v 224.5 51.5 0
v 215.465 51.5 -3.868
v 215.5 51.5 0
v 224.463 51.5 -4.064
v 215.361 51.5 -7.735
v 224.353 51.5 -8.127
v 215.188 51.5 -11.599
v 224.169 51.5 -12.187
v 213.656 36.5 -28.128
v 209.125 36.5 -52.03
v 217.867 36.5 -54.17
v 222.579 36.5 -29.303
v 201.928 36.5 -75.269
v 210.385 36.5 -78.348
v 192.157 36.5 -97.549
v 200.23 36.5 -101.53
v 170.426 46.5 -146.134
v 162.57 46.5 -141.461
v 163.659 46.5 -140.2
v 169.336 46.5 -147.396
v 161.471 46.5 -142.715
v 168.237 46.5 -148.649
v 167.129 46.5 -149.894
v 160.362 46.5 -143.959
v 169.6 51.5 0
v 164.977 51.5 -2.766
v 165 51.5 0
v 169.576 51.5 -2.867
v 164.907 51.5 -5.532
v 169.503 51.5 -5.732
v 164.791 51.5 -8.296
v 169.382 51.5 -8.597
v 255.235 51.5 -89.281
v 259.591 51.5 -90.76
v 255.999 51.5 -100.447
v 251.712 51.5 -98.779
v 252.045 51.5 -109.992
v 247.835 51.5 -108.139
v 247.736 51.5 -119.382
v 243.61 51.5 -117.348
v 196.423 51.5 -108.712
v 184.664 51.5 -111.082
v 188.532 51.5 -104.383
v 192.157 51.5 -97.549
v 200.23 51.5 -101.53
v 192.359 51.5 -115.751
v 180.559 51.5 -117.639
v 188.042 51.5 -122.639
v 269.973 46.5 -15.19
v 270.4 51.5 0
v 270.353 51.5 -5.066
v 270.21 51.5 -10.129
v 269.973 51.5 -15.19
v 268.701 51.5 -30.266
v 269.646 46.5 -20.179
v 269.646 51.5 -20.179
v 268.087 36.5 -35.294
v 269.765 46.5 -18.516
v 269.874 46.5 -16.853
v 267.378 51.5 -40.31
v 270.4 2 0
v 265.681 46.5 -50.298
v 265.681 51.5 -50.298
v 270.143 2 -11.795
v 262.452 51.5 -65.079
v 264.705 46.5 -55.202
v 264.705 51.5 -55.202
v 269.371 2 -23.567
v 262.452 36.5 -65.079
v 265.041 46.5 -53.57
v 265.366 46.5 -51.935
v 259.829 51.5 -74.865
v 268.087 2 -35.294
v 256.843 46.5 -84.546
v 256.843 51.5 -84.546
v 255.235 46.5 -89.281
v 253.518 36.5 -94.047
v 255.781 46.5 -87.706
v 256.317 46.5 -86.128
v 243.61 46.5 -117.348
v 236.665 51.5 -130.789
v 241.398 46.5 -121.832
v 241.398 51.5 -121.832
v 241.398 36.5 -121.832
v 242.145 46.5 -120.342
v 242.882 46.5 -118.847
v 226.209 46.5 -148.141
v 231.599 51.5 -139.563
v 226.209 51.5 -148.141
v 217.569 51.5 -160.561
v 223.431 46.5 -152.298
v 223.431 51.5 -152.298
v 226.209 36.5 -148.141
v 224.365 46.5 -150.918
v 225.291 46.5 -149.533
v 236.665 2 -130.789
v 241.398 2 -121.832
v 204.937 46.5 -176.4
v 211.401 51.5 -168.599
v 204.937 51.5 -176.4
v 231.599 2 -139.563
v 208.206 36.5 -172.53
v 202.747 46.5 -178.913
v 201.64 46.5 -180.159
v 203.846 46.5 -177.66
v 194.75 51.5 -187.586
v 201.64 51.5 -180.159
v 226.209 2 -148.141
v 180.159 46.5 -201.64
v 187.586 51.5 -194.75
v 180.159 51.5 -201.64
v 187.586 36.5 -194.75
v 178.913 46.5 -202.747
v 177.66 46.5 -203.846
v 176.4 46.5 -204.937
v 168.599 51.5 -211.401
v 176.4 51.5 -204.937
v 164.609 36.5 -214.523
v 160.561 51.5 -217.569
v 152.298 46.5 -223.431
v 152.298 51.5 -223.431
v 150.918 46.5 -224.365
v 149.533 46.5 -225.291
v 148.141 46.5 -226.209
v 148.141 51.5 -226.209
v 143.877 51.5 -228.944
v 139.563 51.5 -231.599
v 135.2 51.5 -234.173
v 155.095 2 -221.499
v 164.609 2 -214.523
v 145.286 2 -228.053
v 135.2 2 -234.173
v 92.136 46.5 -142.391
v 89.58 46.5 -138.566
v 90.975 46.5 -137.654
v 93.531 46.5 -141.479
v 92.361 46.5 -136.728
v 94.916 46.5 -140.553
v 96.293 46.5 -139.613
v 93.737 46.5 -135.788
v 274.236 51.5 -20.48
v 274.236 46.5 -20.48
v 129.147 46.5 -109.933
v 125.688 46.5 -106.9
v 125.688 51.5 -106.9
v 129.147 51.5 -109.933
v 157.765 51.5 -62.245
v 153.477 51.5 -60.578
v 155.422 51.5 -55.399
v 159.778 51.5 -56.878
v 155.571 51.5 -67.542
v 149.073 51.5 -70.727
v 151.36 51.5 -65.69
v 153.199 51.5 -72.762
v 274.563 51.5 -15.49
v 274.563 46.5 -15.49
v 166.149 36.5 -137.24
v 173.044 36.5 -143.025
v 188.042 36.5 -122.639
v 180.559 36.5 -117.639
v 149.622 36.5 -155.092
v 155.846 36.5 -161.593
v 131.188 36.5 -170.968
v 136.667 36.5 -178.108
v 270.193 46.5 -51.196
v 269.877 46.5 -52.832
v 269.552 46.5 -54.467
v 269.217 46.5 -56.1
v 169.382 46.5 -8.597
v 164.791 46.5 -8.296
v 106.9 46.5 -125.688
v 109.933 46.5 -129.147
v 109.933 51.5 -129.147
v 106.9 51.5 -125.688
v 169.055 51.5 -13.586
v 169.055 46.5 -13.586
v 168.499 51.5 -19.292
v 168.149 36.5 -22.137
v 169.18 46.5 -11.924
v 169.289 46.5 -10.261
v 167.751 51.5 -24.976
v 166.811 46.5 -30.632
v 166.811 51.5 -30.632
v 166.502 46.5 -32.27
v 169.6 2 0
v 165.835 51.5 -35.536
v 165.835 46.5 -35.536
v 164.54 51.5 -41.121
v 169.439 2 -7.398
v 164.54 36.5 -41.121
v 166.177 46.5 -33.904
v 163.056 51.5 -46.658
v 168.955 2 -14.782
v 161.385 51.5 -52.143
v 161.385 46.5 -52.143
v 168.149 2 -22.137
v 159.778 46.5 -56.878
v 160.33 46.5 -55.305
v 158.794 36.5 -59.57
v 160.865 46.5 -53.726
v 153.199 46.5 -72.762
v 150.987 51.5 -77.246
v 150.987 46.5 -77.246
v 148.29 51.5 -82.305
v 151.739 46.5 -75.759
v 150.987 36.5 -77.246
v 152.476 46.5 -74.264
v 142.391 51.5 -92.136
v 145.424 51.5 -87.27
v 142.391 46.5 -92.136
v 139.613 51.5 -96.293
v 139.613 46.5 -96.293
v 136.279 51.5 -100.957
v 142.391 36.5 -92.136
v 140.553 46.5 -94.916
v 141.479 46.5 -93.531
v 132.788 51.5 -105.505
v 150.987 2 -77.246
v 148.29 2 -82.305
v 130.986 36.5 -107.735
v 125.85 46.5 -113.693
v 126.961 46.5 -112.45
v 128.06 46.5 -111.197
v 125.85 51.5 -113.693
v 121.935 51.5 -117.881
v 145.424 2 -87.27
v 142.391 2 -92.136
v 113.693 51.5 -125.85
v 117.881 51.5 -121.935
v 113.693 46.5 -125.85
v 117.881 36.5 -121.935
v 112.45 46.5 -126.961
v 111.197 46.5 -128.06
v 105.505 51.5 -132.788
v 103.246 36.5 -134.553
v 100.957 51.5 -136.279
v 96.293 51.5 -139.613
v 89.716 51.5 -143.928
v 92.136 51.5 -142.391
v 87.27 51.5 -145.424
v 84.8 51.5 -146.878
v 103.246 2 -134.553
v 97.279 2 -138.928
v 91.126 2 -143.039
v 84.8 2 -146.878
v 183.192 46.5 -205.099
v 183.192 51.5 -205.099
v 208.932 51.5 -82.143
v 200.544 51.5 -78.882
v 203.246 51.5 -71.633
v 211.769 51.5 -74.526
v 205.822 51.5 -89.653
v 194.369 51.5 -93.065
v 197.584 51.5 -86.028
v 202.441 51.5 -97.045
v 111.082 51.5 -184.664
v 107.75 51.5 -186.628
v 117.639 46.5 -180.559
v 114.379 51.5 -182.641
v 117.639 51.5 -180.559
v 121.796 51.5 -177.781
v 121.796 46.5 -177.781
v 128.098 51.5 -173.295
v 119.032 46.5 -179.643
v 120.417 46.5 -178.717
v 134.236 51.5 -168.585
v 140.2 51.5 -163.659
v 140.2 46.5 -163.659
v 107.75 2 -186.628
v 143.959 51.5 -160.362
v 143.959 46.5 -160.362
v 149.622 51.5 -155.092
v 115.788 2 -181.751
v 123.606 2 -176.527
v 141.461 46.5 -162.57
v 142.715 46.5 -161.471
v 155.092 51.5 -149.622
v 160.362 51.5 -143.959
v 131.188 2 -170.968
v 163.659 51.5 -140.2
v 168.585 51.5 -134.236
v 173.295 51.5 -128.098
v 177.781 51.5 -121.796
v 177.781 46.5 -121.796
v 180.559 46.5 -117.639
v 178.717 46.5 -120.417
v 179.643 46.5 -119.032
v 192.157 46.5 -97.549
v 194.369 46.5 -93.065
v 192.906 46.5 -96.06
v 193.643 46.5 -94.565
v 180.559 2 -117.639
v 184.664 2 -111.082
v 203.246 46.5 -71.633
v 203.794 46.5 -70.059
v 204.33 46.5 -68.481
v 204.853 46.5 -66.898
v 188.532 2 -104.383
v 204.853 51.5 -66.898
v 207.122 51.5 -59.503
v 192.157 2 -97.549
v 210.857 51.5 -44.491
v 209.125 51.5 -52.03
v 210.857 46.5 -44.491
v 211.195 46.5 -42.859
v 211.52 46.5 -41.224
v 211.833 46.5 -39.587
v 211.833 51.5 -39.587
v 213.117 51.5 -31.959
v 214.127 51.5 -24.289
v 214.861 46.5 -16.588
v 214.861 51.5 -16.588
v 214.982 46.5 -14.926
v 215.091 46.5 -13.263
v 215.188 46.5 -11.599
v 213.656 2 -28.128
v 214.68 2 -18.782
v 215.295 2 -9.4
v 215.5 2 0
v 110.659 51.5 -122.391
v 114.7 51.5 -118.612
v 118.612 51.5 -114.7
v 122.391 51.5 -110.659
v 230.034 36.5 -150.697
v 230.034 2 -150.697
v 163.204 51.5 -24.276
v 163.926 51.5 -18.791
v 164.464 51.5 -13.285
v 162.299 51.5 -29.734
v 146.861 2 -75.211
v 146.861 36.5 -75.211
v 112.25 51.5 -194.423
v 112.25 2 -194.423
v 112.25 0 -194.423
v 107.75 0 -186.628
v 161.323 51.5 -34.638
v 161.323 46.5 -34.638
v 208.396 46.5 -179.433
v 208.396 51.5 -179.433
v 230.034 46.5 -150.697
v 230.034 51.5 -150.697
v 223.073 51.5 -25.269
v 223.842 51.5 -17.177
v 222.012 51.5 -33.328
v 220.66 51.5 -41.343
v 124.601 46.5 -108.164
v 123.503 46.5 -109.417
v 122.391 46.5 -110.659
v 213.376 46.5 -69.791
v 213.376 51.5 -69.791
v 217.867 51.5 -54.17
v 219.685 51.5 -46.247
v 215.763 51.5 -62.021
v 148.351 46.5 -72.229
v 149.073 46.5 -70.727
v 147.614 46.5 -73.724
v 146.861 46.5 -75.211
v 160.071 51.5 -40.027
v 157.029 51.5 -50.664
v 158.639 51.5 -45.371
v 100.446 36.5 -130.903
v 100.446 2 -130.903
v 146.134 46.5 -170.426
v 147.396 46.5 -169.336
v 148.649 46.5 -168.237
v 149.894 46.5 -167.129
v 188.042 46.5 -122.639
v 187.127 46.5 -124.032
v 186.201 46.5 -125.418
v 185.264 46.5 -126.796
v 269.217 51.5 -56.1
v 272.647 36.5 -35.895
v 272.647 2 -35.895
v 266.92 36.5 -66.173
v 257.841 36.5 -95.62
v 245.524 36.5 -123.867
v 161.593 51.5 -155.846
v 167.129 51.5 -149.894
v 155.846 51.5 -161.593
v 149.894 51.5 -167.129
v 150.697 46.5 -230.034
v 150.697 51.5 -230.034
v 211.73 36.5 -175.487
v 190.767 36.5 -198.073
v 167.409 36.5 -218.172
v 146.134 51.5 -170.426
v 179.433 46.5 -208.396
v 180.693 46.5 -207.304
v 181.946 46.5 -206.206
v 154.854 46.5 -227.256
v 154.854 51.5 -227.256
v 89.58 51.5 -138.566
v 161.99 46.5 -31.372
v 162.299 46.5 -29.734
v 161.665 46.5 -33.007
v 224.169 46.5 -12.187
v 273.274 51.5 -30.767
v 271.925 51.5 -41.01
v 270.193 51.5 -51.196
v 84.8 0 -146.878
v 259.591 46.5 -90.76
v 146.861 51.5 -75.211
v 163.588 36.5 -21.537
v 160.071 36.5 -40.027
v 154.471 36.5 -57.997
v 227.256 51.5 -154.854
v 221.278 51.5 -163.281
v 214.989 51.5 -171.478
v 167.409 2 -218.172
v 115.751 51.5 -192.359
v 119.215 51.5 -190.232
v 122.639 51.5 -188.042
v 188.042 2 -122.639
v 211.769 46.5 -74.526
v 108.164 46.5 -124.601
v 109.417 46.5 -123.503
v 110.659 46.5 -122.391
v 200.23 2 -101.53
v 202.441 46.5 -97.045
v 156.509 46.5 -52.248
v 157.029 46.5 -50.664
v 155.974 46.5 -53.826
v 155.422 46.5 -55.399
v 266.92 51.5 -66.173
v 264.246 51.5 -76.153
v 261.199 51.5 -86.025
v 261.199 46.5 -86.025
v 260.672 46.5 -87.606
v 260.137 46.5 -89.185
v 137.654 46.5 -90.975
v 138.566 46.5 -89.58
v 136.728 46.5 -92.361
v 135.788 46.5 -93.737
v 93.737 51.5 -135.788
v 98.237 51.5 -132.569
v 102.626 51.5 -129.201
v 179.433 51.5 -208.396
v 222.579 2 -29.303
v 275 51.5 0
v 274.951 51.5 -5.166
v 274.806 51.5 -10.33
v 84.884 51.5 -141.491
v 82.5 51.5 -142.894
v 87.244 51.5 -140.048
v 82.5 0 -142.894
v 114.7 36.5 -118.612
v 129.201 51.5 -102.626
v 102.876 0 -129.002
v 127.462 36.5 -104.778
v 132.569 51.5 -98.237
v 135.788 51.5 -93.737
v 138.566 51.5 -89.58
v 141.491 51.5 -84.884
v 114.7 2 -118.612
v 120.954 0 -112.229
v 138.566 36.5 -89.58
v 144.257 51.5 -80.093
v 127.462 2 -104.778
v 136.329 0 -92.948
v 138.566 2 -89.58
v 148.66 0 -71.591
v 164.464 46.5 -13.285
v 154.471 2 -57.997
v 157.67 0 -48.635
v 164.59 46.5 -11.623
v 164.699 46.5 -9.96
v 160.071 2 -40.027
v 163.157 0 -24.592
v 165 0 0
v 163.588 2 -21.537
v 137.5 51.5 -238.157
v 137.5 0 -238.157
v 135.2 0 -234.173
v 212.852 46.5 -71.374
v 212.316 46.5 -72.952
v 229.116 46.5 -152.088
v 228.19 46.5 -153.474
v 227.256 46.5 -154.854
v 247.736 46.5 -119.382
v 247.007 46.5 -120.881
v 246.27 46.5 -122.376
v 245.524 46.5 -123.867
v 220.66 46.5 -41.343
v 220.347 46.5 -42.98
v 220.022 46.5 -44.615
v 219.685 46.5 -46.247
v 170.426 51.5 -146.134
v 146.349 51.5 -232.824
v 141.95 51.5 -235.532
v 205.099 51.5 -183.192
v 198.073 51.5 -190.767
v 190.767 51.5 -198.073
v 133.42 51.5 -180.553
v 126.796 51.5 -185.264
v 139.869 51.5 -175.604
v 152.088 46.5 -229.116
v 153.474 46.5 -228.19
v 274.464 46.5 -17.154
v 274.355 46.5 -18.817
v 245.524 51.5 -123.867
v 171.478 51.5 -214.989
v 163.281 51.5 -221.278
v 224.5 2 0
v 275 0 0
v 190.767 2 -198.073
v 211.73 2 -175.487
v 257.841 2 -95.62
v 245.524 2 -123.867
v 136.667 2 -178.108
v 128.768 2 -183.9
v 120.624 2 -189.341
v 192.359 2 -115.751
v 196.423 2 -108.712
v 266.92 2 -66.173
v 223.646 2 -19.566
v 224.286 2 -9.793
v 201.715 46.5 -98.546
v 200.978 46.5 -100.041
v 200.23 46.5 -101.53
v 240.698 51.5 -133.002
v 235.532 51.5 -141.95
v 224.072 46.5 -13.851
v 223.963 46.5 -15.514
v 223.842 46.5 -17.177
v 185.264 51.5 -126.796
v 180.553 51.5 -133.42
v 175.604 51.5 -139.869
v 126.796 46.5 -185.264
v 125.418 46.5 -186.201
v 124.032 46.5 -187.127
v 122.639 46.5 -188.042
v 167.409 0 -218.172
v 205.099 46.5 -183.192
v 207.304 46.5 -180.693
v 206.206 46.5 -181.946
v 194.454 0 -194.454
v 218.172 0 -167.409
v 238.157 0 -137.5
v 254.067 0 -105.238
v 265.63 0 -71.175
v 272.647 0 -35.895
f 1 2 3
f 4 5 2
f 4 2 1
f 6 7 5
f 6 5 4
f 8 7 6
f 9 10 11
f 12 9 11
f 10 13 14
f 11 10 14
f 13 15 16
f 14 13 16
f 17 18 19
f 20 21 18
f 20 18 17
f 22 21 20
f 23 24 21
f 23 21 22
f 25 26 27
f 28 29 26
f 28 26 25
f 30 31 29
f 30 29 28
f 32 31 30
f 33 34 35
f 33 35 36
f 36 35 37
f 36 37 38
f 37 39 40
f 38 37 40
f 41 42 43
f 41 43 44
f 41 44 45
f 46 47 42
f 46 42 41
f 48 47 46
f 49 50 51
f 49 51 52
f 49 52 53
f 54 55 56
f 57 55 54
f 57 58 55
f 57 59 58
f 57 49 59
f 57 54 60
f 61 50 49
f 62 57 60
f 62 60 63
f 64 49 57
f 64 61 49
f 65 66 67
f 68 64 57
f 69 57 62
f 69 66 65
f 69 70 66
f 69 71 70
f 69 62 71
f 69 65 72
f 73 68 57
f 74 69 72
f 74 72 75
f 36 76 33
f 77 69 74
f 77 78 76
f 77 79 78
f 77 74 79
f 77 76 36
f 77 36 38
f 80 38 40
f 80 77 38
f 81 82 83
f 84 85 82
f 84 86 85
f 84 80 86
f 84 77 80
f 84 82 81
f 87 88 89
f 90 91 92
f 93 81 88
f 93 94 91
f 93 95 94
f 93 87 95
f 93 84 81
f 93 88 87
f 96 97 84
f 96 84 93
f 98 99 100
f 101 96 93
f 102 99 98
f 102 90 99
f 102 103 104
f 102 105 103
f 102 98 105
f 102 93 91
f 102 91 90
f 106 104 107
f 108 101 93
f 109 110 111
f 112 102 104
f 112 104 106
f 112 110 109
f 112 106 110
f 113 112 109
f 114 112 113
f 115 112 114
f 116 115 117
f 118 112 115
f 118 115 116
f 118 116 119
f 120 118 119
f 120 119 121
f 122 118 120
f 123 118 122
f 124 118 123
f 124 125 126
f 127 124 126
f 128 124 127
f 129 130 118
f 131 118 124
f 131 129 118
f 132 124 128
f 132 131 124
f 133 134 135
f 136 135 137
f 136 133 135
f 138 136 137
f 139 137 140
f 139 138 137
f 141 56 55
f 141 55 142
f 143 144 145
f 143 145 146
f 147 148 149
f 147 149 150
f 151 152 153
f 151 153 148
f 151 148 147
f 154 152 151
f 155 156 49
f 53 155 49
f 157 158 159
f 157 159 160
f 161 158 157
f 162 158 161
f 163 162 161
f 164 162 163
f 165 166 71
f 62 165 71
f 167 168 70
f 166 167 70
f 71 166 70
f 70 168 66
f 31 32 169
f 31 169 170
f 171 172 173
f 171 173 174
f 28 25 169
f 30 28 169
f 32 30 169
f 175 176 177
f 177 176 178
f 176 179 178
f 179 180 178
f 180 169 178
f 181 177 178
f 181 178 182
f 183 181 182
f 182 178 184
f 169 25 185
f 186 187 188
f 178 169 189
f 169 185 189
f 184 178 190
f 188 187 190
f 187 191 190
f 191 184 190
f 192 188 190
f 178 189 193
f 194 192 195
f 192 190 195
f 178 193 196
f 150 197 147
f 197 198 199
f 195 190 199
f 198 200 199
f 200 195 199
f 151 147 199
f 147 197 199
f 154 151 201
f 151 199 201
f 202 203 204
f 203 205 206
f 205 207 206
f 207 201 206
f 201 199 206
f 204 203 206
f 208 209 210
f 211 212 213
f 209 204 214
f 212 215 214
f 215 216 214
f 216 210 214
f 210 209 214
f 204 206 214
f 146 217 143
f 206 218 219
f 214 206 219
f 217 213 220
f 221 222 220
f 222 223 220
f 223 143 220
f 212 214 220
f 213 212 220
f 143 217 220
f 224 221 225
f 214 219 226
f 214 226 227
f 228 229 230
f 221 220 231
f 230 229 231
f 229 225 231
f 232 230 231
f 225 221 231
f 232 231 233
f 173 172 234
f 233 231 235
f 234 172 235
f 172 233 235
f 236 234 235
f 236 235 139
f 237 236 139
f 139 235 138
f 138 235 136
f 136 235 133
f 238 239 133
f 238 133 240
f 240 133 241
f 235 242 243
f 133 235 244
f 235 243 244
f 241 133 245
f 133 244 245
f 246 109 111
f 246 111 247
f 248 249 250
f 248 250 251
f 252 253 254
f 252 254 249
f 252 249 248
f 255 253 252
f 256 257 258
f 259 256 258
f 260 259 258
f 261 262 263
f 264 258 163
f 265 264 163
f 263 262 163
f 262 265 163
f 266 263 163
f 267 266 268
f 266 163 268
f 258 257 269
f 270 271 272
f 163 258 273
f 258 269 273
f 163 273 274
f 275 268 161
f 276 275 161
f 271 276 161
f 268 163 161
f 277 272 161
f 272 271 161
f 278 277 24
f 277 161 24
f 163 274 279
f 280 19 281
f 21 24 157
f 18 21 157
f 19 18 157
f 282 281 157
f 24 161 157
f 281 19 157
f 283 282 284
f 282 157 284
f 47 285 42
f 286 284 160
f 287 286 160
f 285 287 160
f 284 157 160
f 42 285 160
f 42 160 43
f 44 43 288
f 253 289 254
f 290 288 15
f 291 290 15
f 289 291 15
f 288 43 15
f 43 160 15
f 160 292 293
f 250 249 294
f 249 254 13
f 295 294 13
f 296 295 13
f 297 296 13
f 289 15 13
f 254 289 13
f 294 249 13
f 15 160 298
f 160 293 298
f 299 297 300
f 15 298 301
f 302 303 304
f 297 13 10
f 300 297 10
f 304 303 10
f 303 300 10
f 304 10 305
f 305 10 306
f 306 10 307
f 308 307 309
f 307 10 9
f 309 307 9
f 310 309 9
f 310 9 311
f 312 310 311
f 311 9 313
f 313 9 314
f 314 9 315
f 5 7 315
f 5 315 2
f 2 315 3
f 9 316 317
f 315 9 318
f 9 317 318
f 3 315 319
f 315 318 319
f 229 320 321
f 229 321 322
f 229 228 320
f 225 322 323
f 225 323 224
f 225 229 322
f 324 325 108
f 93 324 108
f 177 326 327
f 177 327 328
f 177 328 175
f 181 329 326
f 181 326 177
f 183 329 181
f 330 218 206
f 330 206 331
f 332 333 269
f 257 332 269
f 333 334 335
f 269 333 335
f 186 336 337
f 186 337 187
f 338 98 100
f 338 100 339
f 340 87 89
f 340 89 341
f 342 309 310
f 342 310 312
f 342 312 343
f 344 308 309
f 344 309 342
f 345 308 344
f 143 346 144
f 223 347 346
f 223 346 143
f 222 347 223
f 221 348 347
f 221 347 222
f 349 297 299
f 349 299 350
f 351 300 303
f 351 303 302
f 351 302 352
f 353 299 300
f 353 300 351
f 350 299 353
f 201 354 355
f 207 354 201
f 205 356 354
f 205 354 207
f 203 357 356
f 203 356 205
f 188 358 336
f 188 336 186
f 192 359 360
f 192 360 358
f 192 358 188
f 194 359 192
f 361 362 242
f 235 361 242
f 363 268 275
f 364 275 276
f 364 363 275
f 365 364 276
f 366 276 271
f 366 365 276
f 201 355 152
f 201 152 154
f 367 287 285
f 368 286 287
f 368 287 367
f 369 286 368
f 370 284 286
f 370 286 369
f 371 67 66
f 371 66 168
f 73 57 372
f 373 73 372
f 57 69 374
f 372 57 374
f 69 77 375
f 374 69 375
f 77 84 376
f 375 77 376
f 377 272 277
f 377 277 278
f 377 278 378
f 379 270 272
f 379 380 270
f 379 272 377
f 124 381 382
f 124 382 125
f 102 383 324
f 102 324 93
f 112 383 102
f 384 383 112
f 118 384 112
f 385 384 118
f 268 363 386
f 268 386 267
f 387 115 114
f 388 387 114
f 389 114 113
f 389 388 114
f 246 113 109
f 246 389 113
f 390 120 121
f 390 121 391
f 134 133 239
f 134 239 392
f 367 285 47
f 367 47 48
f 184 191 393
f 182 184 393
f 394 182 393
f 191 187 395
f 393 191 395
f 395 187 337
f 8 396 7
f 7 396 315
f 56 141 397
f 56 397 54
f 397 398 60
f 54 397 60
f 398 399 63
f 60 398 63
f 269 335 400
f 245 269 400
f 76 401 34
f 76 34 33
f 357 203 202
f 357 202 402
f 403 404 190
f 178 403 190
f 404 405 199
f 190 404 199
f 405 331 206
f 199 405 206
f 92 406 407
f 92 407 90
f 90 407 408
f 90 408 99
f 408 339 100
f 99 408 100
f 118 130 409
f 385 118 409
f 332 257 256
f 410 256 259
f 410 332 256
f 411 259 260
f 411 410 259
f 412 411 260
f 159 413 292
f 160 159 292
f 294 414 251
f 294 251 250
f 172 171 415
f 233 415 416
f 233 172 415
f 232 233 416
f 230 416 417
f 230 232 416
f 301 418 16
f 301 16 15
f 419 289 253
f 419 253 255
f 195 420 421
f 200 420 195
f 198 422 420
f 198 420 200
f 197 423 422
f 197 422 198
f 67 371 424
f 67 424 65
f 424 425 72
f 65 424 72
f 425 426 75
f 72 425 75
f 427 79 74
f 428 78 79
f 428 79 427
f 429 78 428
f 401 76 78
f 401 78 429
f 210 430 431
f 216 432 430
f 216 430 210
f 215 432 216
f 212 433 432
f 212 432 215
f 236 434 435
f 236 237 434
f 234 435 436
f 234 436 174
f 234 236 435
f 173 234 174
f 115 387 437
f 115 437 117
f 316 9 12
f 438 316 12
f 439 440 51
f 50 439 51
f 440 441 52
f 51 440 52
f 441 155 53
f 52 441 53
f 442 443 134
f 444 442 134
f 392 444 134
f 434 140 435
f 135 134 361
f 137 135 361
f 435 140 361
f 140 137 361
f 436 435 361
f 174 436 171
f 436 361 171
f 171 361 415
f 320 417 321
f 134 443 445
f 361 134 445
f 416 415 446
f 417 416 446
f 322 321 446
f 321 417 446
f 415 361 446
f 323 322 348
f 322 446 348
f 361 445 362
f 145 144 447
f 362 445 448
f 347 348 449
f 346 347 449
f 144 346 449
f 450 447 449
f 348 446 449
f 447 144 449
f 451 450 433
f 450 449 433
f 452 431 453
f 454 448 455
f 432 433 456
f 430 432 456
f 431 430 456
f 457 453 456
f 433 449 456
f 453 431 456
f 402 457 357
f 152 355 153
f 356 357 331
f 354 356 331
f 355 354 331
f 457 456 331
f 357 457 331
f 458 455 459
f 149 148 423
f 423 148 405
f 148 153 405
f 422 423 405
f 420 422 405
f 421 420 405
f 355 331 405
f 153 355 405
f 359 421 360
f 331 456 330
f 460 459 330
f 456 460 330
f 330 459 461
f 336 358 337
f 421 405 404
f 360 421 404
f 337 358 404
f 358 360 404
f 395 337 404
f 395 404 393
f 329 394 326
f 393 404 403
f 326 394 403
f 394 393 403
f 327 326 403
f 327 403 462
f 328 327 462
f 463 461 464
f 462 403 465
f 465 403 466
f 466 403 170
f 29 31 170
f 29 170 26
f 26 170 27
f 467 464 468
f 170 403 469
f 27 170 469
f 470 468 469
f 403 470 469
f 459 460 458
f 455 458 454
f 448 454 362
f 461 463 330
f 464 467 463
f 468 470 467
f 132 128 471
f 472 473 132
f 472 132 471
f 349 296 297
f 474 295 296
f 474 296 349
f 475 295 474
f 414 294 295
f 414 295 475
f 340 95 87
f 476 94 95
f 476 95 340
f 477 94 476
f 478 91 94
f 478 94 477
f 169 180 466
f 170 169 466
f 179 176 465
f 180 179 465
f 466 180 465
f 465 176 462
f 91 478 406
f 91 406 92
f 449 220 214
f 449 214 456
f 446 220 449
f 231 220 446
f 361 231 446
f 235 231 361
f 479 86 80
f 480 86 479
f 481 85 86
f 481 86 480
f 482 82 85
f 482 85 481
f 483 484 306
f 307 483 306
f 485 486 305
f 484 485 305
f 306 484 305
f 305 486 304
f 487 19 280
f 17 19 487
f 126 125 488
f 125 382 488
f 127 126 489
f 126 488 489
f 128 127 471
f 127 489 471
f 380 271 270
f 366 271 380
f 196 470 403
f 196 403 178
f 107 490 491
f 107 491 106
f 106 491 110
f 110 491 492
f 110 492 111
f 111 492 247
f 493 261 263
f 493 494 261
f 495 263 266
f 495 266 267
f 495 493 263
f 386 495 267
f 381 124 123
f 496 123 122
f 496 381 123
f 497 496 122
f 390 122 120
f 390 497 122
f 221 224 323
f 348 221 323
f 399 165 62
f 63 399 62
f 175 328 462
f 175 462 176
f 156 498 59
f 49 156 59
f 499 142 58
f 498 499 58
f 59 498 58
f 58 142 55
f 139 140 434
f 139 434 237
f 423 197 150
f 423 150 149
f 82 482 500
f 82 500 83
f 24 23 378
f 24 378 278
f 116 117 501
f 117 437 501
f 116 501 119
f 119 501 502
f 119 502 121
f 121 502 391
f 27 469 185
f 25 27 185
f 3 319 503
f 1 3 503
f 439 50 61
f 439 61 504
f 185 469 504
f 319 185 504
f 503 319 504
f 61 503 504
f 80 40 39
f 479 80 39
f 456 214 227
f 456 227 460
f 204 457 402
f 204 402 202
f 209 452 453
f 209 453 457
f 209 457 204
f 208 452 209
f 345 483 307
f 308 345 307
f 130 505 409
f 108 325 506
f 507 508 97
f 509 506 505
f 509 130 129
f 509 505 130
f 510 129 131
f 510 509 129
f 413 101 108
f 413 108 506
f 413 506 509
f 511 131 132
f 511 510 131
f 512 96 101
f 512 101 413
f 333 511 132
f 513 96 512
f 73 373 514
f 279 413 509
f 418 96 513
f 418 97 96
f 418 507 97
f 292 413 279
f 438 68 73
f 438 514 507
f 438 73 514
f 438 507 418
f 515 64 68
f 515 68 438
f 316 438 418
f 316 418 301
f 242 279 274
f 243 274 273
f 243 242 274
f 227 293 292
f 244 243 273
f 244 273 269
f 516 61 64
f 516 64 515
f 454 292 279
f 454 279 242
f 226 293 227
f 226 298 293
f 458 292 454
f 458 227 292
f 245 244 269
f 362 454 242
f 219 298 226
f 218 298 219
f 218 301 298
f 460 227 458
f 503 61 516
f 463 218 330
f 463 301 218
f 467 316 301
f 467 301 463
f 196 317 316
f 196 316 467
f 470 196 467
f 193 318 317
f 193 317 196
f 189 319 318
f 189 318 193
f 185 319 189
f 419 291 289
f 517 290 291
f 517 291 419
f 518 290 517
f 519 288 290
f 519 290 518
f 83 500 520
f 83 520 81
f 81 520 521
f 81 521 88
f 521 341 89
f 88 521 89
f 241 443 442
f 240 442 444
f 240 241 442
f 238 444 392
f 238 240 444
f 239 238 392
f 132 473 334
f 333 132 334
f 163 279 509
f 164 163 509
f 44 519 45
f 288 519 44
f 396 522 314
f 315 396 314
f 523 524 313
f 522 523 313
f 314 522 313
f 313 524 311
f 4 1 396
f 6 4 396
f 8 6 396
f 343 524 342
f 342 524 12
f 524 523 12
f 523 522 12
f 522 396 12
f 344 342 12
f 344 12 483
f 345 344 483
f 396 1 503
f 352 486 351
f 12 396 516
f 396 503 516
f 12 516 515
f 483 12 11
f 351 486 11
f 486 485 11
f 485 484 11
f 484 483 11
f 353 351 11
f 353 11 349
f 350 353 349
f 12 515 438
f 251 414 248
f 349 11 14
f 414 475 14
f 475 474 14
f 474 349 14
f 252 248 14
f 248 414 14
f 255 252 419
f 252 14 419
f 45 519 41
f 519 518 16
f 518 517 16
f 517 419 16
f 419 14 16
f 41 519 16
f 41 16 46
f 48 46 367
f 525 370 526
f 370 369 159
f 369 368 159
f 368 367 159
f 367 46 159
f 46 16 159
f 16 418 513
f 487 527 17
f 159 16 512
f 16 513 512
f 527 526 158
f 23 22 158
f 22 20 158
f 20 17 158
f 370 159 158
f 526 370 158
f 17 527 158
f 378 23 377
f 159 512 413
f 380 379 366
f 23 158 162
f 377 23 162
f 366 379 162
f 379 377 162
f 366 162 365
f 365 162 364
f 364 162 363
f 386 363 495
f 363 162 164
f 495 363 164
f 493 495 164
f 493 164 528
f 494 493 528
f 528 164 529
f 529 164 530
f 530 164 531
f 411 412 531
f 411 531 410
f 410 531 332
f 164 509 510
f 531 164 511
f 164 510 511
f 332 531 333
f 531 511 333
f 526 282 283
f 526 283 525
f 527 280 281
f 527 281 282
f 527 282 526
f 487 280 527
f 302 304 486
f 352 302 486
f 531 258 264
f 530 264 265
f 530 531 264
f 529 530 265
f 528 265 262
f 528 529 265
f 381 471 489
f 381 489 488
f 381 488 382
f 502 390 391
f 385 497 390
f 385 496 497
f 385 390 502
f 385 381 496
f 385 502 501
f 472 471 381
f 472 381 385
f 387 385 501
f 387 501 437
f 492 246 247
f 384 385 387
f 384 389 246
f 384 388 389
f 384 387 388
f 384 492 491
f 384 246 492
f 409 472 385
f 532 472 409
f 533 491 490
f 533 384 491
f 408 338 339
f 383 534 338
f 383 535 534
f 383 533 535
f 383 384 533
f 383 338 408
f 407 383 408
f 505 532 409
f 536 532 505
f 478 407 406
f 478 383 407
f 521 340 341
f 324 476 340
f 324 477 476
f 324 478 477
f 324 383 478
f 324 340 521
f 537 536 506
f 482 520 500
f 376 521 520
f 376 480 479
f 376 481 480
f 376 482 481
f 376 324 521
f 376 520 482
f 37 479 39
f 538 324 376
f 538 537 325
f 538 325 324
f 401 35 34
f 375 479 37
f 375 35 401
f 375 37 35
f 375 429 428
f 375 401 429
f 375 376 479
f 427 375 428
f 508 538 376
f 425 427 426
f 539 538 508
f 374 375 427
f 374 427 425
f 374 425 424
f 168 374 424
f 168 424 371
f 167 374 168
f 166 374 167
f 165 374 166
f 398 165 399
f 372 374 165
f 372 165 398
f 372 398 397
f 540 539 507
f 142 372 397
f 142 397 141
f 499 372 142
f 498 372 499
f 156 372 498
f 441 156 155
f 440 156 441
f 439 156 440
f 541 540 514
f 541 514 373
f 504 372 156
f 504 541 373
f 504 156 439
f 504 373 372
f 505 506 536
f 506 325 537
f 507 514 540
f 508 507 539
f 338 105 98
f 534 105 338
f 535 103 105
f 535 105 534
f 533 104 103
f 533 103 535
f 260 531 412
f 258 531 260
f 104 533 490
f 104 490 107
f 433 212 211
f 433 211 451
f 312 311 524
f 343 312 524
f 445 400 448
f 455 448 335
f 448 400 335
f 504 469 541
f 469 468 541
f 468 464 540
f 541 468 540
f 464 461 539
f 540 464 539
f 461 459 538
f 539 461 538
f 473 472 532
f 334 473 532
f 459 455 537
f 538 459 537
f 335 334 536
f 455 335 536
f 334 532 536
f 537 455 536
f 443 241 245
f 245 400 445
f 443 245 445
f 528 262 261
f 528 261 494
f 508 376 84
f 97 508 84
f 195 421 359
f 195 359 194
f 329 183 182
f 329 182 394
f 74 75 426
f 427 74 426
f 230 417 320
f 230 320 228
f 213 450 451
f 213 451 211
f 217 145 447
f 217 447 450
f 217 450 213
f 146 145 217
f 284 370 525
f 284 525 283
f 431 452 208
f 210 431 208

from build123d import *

# Parameters (mm, degrees)
AUFSATZ_LINEAR_AUSTRAGEN1_DEPTH   = 51.5
AUFSATZ_LINEAR_AUSTRAGEN1_2_DEPTH = 51.5
AUFSATZ_LINEAR_AUSTRAGEN1_3_DEPTH = 51.5
SCHNITT_LINEAR_START              = -5
SCHNITT_LINEAR_AUSTRAGEN1_DEPTH   = 5
AUFSATZ_LINEAR_AUSTRAGEN2_DEPTH   = 2
SCHNITT_LINEAR_START_2            = -49.5
SCHNITT_LINEAR_AUSTRAGEN2_DEPTH   = 34.5


with BuildPart() as part:
    # Skizze1 → Aufsatz-Linear austragen1 (new body)
    with BuildSketch(Plane(origin=(0, 0, 0), x_dir=(1, 0, 0), z_dir=(0, 1, 0))):
        with BuildLine():
            Line((165, 0), (169.6, 0))
            ThreePointArc((169.6, 0), (146.877908482, 84.8), (84.8, 146.877908482))
            Line((84.8, 146.877908482), (82.5, 142.894191624))
            ThreePointArc((82.5, 142.894191624), (142.894191624, 82.5), (165, 0))
        make_face()
    extrude(amount=AUFSATZ_LINEAR_AUSTRAGEN1_DEPTH)


with BuildPart() as body_2:
    # Skizze1 → Aufsatz-Linear austragen1 2 (new body)
    with BuildSketch(Plane(origin=(0, 0, 0), x_dir=(1, 0, 0), z_dir=(0, 1, 0))):
        with BuildLine():
            Line((215.5, 0), (224.5, 0))
            ThreePointArc((224.5, 0), (194.42270315, 112.25), (112.25, 194.42270315))
            Line((112.25, 194.42270315), (107.75, 186.628474516))
            ThreePointArc((107.75, 186.628474516), (186.628474516, 107.75), (215.5, 0))
        make_face()
    extrude(amount=AUFSATZ_LINEAR_AUSTRAGEN1_2_DEPTH)


with BuildPart() as body_3:
    # Skizze1 → Aufsatz-Linear austragen1 3 (new body)
    with BuildSketch(Plane(origin=(0, 0, 0), x_dir=(1, 0, 0), z_dir=(0, 1, 0))):
        with BuildLine():
            Line((135.2, 234.173269183), (137.5, 238.156986041))
            ThreePointArc((137.5, 238.156986041), (238.156986041, 137.5), (275, 0))
            Line((275, 0), (270.4, 0))
            ThreePointArc((270.4, 0), (234.173269183, 135.2), (135.2, 234.173269183))
        make_face()
    extrude(amount=AUFSATZ_LINEAR_AUSTRAGEN1_3_DEPTH)


with BuildPart() as schnitt_linear_austragen1_tool:
    # Skizze2 → Schnitt-Linear austragen1 (new body)
    with BuildSketch(Plane(origin=(0, 51.5, 0), x_dir=(1, 0, 0), z_dir=(0, 1, 0)).offset(SCHNITT_LINEAR_START)):
        with BuildLine():
            Line((164.464314583, 13.284924864), (274.236356527, 20.479764614))
            ThreePointArc((274.236356527, 20.479764614), (274.411203891, 17.985860538), (274.563372173, 15.490469997))
            Line((274.563372173, 15.490469997), (164.791330229, 8.295630248))
            ThreePointArc((164.791330229, 8.295630248), (164.646722334, 10.791516323), (164.464314583, 13.284924864))
        make_face()
        with BuildLine():
            Line((161.323268916, 34.638171229), (269.217080788, 56.099584774))
            ThreePointArc((269.217080788, 56.099584774), (269.715952111, 53.649838554), (270.192532398, 51.195658372))
            Line((270.192532398, 51.195658372), (162.298720527, 29.734244827))
            ThreePointArc((162.298720527, 29.734244827), (161.829571267, 32.189903133), (161.323268916, 34.638171229))
        make_face()
        with BuildLine():
            Line((157.029134718, 50.664098233), (261.198623482, 86.024874838))
            ThreePointArc((261.198623482, 86.024874838), (260.405785611, 88.395852958), (259.591426156, 90.759525485))
            Line((259.591426156, 90.759525485), (155.421937391, 55.398748881))
            ThreePointArc((155.421937391, 55.398748881), (156.243471367, 53.037511775), (157.029134718, 50.664098233))
        make_face()
        with BuildLine():
            Line((149.072736877, 70.727074872), (247.735533701, 119.382181845))
            ThreePointArc((247.735533701, 119.382181845), (246.640003921, 121.62938981), (245.52409025, 123.866545552))
            Line((245.52409025, 123.866545552), (146.861293426, 75.211438579))
            ThreePointArc((146.861293426, 75.211438579), (147.984002353, 72.977633886), (149.072736877, 70.727074872))
        make_face()
        with BuildLine():
            Line((138.565663178, 89.57989165), (230.033620252, 150.696826621))
            ThreePointArc((230.033620252, 150.696826621), (228.654143383, 152.78181408), (227.255769087, 154.854174683))
            Line((227.255769087, 154.854174683), (135.787812013, 93.737239712))
            ThreePointArc((135.787812013, 93.737239712), (137.19248603, 91.669088448), (138.565663178, 89.57989165))
        make_face()
        with BuildLine():
            Line((125.687692564, 106.899971646), (208.395767784, 179.433006913))
            ThreePointArc((208.395767784, 179.433006913), (206.755947057, 181.320099153), (205.099038708, 183.19220595))
            Line((205.099038708, 183.19220595), (122.390963489, 110.659170683))
            ThreePointArc((122.390963489, 110.659170683), (124.053568234, 108.792059492), (125.687692564, 106.899971646))
        make_face()
        with BuildLine():
            Line((110.659170683, 122.390963489), (183.19220595, 205.099038708))
            ThreePointArc((183.19220595, 205.099038708), (181.320099153, 206.755947057), (179.433006913, 208.395767784))
            Line((179.433006913, 208.395767784), (106.899971646, 125.687692564))
            ThreePointArc((106.899971646, 125.687692564), (108.792059492, 124.053568234), (110.659170683, 122.390963489))
        make_face()
        with BuildLine():
            Line((93.737239712, 135.787812013), (154.854174683, 227.255769087))
            ThreePointArc((154.854174683, 227.255769087), (152.78181408, 228.654143383), (150.696826621, 230.033620252))
            Line((150.696826621, 230.033620252), (89.57989165, 138.565663178))
            ThreePointArc((89.57989165, 138.565663178), (91.669088448, 137.19248603), (93.737239712, 135.787812013))
        make_face()
    extrude(amount=SCHNITT_LINEAR_AUSTRAGEN1_DEPTH)


with BuildPart() as part_1:
    add(part.part)

    # Schnitt-Linear austragen1: cut by schnitt_linear_austragen1_tool
    add(schnitt_linear_austragen1_tool.part, mode=Mode.SUBTRACT)



with BuildPart() as body_2_1:
    add(body_2.part)

    # Schnitt-Linear austragen1: cut by schnitt_linear_austragen1_tool
    add(schnitt_linear_austragen1_tool.part, mode=Mode.SUBTRACT)


with BuildPart() as body_3_1:
    add(body_3.part)

    # Schnitt-Linear austragen1: cut by schnitt_linear_austragen1_tool
    add(schnitt_linear_austragen1_tool.part, mode=Mode.SUBTRACT)


with BuildPart() as part_2:
    add(part_1.part)

    add(body_2_1.part)  # Aufsatz-Linear austragen2 merges body 2

    add(body_3_1.part)  # Aufsatz-Linear austragen2 merges body 3
    # Skizze4 → Aufsatz-Linear austragen2 (add)
    with BuildSketch(Plane.XZ):
        with BuildLine():
            Line((165, 0), (275, 0))
            ThreePointArc((275, 0), (238.156986041, -137.5), (137.5, -238.156986041))
            Line((137.5, -238.156986041), (82.5, -142.894191624))
            ThreePointArc((82.5, -142.894191624), (142.894191624, -82.5), (165, 0))
        make_face()
    extrude(amount=-AUFSATZ_LINEAR_AUSTRAGEN2_DEPTH)

    # Skizze5 → Schnitt-Linear austragen2 (cut)
    with BuildSketch(Plane(origin=(0, 51.5, 0), x_dir=(1, 0, 0), z_dir=(0, 1, 0)).offset(SCHNITT_LINEAR_START_2)):
        with BuildLine():
            Line((100.445635786, 130.903301148), (167.409392977, 218.17216858))
            ThreePointArc((167.409392977, 218.17216858), (201.565045666, 187.073601466), (230.033620252, 150.696826621))
            Line((230.033620252, 150.696826621), (138.565663178, 89.57989165))
            ThreePointArc((138.565663178, 89.57989165), (121.278630852, 111.877136622), (100.445635786, 130.903301148))
        make_face()
        with BuildLine():
            Line((163.588402127, 21.536821716), (272.647336878, 35.894702861))
            ThreePointArc((272.647336878, 35.894702861), (262.79301408, 81.023649329), (245.52409025, 123.866545552))
            Line((245.52409025, 123.866545552), (146.861293426, 75.211438579))
            ThreePointArc((146.861293426, 75.211438579), (157.527757843, 49.091806943), (163.588402127, 21.536821716))
        make_face()
    extrude(amount=SCHNITT_LINEAR_AUSTRAGEN2_DEPTH, mode=Mode.SUBTRACT)


solid = part_2.part
